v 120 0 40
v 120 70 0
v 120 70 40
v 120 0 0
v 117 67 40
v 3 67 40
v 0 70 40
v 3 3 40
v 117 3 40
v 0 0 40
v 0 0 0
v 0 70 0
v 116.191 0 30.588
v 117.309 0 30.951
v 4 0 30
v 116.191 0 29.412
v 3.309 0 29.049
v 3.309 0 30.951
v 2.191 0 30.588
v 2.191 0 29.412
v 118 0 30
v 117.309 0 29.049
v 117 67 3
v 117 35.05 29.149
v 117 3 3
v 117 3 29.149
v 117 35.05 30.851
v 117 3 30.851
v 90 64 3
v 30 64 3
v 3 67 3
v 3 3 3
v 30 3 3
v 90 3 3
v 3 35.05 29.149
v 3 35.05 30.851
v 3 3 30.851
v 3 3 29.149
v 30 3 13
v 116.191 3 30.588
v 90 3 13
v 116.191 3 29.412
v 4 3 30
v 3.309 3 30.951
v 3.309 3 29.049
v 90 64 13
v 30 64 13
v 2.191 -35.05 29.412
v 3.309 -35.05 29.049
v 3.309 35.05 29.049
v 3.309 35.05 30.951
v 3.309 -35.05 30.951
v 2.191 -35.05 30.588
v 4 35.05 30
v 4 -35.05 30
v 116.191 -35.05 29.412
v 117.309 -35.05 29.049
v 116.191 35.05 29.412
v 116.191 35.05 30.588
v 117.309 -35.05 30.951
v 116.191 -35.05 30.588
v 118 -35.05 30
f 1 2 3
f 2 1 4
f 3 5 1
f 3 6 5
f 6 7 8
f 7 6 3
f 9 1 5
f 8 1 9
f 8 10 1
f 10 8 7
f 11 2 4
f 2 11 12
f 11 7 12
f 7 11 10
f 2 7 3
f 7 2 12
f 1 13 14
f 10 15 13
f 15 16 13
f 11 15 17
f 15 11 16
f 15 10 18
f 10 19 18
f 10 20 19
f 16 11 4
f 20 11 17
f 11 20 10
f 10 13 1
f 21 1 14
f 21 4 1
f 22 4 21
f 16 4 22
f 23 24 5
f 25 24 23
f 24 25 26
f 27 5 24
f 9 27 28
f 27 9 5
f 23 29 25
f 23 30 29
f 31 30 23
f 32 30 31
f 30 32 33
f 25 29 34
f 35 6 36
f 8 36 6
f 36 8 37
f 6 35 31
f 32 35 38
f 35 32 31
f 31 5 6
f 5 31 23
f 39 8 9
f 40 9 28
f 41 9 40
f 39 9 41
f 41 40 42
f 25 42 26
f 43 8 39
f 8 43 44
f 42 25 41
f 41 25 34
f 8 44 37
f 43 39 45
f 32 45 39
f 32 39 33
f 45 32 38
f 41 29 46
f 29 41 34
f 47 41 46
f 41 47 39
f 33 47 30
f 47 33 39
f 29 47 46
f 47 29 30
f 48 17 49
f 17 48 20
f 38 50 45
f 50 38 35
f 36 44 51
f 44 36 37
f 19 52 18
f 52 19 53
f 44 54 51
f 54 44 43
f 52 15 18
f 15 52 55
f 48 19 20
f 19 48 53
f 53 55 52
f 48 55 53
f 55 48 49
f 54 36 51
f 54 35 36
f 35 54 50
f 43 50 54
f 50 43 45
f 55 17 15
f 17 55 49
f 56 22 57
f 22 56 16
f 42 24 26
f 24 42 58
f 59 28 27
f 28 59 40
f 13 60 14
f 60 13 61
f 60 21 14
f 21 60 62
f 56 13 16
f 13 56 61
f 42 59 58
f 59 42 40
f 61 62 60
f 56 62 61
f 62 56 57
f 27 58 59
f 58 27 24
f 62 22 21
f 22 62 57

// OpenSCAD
// --- Buffer tank for mini horizontal gel-electrophoresis box ---
// Print orientation: resting on XY plane at z = 0, building upward (+Z)
// Centre on origin in X and Y

// Outer dimensions
outer_x = 120;       // mm, outer length in X
outer_y = 70;         // mm, outer width in Y
outer_z = 40;         // mm, outer height in Z

// Wall and floor thickness
wall_thick = 3;       // mm, wall thickness
floor_thick = 3;      // mm, floor thickness

// Gel platform
platform_length = 60; // mm, length in X (centred)
platform_top_z = 13;  // mm, top of platform above inner floor (z = 13)
platform_thickness = platform_top_z - floor_thick; // 10 mm thick platform

// Electrode wire holes
wire_hole_dia = 2;    // mm, diameter of wire holes
wire_hole_z = 30;     // mm, height of wire holes

// Inner dimensions
inner_x = outer_x - 2 * wall_thick;
inner_y = outer_y - 2 * wall_thick;

// Platform half-lengths
plat_half_x = platform_length / 2;

// Build the tank
module tank() {
    // Outer shell (solid block)
    difference() {
        // Main outer block
        cube([outer_x, outer_y, outer_z], center = false);
        
        // Inner cavity (subtract inner volume)
        translate([wall_thick, wall_thick, floor_thick]) {
            cube([inner_x, inner_y, outer_z - floor_thick], center = false);
        }
        
        // Gel platform (solid, so we subtract the space it occupies from the cavity)
        // The platform is solid, so we need to add it back
        // Actually, let's think differently: build the tank as a shell, then add the platform
        
        // Let me reconsider: build the outer shell, then subtract the inner cavity,
        // but leave the platform area filled. The platform is at z = floor_thick to z = platform_top_z.
        // The inner cavity goes from z = floor_thick to z = outer_z.
        // The platform occupies: x from (outer_x/2 - plat_half_x) to (outer_x/2 + plat_half_x),
        // y from 0 to inner_y (full inner width), z from floor_thick to platform_top_z.
        
        // So we need to add back the platform volume to the inner cavity subtraction
        // Let's use a different approach: build the tank walls and floor, then add the platform
        
        // Actually, let me rebuild this more carefully:
        // 1. Start with a solid block
        // 2. Subtract the inner cavity (which is the tank interior)
        // 3. Add back the platform (which is solid)
    }
    
    // Let me use a cleaner approach:
    union() {
        // Tank walls and floor (hollow box)
        difference() {
            // Outer block
            cube([outer_x, outer_y, outer_z], center = false);
            
            // Inner cavity (open at top)
            translate([wall_thick, wall_thick, floor_thick]) {
                cube([inner_x, inner_y, outer_z - floor_thick], center = false);
            }
        }
        
        // Gel platform (solid)
        translate([outer_x/2 - plat_half_x, 0, floor_thick]) {
            cube([platform_length, inner_y, platform_thickness], center = false);
        }
    }
    
    // Drill electrode wire holes through end walls
    for (x_pos = [wall_thick, outer_x - wall_thick]) {
        translate([x_pos, 0, wire_hole_z]) {
            rotate([90, 0, 0]) {
                cylinder(d = wire_hole_dia, h = outer_y + 0.1, center = true);
            }
        }
    }
}

tank();
